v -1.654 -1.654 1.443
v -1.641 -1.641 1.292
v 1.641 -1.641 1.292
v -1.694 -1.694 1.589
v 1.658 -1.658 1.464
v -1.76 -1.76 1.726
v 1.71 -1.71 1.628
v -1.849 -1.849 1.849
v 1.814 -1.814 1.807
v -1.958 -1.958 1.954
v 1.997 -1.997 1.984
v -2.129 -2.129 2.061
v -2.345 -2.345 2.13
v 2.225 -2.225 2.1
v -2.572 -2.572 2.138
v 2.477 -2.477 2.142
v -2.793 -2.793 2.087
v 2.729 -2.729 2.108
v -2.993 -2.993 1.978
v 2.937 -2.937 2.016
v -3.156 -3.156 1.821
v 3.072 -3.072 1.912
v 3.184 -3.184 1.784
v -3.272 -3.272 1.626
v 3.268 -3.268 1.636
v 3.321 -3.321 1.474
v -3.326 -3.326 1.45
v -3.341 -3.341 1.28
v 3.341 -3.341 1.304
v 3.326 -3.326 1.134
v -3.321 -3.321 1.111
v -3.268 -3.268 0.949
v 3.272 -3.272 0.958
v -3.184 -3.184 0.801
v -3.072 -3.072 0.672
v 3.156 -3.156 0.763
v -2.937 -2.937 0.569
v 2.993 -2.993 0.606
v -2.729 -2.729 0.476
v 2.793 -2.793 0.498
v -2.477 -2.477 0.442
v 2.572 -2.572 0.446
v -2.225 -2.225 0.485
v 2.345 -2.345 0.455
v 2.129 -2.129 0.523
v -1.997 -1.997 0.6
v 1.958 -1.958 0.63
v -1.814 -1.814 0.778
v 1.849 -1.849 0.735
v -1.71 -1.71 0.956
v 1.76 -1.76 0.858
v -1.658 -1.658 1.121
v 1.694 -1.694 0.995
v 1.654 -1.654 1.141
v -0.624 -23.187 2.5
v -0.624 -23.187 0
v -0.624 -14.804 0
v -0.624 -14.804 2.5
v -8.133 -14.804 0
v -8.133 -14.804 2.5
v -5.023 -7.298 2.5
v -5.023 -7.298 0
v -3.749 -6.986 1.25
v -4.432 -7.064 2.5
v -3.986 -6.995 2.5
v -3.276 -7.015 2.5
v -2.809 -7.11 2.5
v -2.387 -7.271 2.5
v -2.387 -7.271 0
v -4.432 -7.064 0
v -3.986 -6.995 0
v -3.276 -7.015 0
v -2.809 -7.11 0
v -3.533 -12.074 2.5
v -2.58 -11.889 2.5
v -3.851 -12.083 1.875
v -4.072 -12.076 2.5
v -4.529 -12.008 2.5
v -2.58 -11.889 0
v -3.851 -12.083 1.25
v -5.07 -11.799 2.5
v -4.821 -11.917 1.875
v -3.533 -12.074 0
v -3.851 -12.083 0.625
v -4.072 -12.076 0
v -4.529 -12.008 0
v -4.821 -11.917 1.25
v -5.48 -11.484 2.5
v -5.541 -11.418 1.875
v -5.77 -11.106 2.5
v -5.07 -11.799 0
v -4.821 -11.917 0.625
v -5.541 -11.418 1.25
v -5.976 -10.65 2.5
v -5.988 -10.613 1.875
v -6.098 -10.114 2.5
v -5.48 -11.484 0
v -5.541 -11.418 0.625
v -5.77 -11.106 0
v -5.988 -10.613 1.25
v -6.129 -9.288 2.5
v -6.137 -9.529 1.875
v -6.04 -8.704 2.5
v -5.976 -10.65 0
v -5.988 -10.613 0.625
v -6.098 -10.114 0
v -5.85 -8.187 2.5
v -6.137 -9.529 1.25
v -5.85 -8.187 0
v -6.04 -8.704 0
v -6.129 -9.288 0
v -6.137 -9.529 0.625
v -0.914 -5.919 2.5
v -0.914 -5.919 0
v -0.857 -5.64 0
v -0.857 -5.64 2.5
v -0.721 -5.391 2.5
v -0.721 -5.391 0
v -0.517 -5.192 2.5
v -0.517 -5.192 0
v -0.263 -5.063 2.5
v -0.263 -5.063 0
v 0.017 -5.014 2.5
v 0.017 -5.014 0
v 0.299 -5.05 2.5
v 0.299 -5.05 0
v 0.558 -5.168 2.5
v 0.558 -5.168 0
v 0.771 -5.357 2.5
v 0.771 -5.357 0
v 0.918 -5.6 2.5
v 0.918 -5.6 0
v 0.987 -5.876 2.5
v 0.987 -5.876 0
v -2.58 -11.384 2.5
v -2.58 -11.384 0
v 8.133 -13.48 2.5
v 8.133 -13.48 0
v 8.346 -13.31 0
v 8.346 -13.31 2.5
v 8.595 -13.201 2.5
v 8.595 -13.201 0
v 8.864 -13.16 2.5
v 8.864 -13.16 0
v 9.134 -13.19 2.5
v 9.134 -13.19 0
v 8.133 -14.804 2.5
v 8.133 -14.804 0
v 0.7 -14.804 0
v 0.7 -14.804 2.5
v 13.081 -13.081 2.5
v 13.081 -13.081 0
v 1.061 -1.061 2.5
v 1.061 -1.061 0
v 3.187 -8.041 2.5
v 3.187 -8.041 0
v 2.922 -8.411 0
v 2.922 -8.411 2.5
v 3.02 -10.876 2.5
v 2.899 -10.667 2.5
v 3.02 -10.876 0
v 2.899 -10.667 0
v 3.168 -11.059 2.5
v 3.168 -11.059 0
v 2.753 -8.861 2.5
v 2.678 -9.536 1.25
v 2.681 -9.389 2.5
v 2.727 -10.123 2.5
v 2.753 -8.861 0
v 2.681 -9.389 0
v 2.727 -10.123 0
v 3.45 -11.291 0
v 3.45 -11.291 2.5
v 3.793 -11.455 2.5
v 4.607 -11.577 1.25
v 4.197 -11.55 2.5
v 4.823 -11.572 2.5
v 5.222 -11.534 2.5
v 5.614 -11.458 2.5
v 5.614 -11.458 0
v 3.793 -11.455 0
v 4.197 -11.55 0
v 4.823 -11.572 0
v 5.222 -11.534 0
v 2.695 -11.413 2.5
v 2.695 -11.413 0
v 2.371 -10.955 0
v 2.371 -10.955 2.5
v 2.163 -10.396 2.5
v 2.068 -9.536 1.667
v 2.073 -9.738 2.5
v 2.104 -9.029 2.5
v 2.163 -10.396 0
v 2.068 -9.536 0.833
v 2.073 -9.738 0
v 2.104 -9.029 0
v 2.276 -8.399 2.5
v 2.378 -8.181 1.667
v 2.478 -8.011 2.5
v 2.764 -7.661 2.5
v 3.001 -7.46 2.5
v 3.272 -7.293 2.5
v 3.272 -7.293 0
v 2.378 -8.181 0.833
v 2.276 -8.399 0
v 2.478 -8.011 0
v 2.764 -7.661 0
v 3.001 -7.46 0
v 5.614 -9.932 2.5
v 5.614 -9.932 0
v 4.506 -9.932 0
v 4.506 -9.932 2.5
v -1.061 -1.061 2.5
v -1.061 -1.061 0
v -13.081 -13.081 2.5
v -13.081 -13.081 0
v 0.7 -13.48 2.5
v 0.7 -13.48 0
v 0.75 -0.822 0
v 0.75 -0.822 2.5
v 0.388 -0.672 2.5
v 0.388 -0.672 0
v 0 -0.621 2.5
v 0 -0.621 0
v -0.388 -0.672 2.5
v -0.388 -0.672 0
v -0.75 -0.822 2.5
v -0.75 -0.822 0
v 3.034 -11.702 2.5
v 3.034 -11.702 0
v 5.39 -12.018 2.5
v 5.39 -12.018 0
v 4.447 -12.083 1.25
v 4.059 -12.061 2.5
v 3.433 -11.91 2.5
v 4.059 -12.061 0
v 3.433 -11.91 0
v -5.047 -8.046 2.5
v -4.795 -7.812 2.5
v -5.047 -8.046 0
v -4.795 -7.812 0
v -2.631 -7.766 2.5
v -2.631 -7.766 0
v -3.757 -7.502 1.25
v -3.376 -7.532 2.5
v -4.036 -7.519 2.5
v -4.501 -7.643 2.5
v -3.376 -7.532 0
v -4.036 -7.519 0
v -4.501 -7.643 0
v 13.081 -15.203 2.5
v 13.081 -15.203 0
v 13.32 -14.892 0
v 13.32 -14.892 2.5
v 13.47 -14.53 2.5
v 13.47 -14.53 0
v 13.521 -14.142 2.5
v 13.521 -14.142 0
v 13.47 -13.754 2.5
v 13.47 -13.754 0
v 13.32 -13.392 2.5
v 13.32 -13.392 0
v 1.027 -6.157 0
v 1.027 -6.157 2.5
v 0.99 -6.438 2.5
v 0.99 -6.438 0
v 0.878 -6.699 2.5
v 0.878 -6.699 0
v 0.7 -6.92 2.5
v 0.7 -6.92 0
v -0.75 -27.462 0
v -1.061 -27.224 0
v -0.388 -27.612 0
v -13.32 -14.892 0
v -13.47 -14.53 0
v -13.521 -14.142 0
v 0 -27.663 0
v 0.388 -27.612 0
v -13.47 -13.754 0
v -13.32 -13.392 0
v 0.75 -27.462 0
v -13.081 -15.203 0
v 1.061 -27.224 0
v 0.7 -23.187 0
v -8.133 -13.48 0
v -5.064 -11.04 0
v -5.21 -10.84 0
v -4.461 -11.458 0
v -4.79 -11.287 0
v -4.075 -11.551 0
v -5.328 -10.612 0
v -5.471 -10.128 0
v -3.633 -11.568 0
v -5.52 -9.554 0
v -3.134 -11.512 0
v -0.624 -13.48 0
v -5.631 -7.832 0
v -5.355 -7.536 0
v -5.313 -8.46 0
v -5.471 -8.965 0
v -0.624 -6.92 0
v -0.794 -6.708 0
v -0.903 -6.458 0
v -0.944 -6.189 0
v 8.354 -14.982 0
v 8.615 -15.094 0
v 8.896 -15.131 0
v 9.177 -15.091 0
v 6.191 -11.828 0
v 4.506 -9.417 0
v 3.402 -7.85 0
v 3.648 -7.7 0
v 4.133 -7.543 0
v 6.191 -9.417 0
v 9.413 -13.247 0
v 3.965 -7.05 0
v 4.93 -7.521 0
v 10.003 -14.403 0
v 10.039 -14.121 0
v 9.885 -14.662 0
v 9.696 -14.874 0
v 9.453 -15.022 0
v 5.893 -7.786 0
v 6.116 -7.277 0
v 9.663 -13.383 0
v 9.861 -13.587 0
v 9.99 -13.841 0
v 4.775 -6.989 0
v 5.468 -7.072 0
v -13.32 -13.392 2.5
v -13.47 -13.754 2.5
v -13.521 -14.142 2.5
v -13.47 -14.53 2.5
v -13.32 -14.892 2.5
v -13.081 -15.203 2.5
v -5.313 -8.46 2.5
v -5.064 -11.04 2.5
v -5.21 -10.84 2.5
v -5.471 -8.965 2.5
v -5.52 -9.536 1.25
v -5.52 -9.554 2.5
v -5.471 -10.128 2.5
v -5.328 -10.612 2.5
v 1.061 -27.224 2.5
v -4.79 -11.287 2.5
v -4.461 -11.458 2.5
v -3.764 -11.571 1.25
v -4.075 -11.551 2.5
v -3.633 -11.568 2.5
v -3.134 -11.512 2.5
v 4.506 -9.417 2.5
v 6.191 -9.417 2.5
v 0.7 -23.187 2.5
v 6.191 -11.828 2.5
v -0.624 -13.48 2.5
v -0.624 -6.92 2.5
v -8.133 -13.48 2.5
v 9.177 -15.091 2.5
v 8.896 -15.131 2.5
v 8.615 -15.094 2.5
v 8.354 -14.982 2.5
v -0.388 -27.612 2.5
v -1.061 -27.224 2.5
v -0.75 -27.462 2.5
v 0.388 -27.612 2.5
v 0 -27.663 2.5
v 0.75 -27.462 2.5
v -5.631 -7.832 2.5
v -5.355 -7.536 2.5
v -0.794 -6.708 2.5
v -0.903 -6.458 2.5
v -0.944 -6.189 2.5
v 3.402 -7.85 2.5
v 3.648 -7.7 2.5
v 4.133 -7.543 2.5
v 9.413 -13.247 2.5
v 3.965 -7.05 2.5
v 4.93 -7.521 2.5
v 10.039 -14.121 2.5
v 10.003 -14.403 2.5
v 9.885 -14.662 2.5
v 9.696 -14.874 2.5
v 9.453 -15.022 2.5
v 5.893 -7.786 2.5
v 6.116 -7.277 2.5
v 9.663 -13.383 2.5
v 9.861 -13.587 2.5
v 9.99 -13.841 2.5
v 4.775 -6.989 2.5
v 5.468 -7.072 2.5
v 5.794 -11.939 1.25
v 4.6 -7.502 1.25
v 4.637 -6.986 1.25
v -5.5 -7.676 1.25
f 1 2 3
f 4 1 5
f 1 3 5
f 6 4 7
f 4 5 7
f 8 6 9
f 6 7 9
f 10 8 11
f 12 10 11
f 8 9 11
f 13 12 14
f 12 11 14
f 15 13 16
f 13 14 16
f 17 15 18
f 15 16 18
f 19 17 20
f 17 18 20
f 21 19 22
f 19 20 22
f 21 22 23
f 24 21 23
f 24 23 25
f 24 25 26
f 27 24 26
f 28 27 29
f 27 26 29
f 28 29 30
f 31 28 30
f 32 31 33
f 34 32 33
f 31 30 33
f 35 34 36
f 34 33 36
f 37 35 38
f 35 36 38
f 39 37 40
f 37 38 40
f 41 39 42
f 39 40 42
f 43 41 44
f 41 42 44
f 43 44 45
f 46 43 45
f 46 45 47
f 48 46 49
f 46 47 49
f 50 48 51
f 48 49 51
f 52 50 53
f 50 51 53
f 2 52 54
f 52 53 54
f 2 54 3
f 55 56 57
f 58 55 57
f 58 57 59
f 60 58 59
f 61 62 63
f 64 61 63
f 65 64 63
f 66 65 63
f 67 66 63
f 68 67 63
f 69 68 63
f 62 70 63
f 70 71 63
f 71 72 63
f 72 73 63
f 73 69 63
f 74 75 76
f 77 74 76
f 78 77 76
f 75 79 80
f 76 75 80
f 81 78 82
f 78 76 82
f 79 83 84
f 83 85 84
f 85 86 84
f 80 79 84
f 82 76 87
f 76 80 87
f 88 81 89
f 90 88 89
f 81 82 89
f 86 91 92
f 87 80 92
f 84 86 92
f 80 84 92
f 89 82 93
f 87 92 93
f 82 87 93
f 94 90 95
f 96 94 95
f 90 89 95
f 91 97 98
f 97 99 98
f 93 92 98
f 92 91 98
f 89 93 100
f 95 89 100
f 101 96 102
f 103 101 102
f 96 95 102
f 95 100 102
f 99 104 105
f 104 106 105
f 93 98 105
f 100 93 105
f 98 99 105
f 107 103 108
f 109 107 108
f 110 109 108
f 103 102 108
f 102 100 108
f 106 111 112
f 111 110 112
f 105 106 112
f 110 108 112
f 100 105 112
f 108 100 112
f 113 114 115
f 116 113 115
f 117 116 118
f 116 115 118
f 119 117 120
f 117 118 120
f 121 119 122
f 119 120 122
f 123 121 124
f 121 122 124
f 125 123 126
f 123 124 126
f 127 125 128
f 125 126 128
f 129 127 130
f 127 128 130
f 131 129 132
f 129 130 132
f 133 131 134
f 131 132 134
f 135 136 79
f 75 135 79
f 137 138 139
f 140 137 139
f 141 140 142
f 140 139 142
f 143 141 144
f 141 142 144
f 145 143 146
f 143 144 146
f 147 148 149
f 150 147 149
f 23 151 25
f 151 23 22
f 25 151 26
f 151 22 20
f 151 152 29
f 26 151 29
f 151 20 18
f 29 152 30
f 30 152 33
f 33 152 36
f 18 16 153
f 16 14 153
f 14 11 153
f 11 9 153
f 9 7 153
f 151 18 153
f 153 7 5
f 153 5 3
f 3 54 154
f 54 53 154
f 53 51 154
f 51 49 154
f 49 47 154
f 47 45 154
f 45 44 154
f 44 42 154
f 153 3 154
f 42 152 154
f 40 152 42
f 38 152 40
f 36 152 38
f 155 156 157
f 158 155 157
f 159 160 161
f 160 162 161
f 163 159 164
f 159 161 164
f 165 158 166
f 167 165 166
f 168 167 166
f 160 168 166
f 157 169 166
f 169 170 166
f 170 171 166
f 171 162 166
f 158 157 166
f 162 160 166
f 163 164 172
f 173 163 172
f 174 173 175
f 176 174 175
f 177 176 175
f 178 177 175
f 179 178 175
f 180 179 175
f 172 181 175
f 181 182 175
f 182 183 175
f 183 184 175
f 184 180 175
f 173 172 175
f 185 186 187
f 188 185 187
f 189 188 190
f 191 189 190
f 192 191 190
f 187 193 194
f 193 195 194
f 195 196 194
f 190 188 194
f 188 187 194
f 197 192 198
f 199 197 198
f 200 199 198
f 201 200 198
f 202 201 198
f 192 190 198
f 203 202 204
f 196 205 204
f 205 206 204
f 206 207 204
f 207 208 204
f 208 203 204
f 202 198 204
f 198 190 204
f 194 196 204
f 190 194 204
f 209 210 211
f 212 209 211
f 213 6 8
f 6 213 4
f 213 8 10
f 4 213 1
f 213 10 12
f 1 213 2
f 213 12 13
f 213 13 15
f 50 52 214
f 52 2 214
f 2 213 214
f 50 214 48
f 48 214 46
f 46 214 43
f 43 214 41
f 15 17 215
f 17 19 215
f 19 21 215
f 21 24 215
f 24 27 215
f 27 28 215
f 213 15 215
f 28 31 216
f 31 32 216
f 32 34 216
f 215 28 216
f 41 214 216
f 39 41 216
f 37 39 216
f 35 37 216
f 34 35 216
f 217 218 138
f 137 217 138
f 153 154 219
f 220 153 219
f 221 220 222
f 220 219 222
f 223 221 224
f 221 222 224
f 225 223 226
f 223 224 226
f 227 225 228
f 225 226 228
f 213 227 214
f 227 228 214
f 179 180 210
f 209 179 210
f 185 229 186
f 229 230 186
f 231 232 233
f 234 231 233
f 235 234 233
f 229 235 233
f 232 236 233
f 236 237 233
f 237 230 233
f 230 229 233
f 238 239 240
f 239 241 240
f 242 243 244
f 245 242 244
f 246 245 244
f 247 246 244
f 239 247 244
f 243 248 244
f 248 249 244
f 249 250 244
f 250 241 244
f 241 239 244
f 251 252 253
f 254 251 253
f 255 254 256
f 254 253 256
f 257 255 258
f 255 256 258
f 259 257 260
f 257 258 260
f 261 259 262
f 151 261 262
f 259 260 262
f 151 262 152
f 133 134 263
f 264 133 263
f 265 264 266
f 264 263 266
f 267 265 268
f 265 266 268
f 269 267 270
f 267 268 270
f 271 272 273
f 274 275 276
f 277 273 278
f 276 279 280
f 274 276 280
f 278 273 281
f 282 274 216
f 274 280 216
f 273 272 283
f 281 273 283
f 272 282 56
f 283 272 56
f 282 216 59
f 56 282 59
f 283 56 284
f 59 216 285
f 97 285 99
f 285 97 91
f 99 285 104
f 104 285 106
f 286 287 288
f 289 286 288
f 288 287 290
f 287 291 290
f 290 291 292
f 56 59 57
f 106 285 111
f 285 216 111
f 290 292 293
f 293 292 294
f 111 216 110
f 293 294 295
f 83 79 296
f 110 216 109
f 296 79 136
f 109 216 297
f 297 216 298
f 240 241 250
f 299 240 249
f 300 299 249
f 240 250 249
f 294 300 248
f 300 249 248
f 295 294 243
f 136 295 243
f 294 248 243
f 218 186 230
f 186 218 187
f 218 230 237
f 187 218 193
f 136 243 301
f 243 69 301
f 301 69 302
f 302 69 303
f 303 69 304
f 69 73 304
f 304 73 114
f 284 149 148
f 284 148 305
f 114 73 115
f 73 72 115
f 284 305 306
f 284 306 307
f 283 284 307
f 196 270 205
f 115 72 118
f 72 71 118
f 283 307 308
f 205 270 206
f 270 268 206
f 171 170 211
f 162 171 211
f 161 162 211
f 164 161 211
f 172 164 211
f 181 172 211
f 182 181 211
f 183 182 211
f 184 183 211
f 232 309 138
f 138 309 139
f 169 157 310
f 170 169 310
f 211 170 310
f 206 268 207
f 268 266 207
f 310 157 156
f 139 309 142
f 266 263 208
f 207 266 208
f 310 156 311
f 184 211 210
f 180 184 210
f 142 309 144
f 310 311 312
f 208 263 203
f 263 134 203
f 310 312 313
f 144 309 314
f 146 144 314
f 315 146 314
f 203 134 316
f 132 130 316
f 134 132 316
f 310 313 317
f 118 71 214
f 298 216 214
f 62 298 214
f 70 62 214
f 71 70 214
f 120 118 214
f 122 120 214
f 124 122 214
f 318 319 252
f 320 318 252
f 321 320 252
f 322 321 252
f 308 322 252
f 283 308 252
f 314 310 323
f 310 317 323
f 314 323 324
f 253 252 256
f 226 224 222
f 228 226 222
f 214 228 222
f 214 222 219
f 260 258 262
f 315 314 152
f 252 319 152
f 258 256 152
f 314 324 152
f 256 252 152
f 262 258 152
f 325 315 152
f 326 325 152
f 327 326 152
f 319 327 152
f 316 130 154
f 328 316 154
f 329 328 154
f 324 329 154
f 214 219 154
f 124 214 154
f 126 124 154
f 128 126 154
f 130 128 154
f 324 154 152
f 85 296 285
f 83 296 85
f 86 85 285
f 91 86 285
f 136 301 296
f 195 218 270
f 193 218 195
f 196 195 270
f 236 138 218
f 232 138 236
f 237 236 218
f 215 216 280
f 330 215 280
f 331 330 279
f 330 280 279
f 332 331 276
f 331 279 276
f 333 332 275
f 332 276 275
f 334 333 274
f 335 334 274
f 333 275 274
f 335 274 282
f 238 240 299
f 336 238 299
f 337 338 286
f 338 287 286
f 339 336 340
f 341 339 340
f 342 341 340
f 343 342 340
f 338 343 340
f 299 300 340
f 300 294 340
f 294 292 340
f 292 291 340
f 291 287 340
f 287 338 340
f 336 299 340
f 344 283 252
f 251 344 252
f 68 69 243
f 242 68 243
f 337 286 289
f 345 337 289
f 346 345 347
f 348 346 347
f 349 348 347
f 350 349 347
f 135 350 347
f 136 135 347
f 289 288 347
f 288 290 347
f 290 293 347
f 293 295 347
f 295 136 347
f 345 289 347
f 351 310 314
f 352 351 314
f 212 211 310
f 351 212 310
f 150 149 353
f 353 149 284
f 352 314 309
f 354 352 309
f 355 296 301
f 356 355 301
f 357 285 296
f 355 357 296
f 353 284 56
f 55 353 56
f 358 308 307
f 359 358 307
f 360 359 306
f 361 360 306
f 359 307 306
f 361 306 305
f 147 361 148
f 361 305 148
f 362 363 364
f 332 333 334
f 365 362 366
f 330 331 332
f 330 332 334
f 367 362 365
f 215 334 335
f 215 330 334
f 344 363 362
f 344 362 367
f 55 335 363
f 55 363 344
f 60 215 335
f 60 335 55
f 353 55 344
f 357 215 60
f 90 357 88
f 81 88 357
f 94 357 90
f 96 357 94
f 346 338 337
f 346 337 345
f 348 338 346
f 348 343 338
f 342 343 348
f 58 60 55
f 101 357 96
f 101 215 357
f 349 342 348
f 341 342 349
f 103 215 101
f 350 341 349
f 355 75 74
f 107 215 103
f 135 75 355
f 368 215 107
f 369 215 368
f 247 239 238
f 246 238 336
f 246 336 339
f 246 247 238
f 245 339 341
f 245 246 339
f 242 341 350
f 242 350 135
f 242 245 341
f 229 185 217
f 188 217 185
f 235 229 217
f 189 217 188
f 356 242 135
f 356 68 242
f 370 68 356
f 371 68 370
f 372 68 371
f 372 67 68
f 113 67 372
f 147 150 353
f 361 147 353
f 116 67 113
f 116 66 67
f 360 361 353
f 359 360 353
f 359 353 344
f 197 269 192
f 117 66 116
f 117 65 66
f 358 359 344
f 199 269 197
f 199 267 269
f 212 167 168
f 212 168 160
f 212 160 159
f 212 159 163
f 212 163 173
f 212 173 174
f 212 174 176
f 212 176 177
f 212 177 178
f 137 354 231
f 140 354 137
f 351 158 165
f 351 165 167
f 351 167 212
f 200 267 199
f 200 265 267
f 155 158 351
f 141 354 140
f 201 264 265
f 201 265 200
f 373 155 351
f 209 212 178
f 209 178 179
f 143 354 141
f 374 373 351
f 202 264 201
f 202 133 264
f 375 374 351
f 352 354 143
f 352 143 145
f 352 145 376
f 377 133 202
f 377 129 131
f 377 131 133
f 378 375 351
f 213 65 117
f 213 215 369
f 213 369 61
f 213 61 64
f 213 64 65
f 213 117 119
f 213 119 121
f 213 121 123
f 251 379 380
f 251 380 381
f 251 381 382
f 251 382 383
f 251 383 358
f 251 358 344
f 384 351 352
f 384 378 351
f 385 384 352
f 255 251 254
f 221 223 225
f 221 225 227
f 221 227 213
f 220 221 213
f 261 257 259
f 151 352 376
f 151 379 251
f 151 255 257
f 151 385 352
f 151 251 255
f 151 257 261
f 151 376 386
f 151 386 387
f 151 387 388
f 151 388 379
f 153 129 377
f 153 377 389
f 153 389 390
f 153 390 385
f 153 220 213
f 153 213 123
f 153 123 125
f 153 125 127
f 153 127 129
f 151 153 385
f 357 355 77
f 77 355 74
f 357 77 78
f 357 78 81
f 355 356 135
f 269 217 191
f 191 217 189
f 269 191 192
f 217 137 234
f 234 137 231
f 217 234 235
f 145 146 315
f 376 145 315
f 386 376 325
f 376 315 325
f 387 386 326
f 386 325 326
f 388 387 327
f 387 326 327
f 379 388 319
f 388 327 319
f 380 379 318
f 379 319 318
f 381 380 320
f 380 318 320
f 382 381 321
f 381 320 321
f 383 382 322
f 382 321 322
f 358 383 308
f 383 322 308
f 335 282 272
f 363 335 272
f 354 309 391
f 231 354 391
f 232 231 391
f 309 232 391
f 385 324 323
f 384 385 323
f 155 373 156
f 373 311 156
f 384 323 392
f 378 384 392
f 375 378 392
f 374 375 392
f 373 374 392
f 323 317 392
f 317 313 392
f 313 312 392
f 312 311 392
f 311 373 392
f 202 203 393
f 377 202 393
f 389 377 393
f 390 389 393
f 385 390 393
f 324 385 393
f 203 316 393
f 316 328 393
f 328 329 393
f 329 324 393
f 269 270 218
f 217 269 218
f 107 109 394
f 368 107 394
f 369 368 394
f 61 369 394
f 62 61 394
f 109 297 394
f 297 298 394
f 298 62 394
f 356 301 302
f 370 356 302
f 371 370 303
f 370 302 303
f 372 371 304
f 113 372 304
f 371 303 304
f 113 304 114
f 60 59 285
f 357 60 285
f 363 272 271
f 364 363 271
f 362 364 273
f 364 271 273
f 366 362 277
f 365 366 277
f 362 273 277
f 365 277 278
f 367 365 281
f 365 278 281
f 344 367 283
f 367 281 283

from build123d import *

# Parameters (mm, degrees)
F1_DEPTH = 2.5
F2_R     = 0.85
F3_DEPTH = 12.5


with BuildPart() as f1:
    # F0 (on Top) → F1 (new body)
    with BuildSketch(Plane.XY):
        with BuildLine():
            Line((13.081475452, -13.081475452), (1.0606601718, -1.0606601718))
            ThreePointArc((1.0606601718, -1.0606601718), (0, -0.6213203436), (-1.0606601718, -1.0606601718))
            Line((-1.0606601718, -1.0606601718), (-13.081475452, -13.081475452))
            ThreePointArc((-13.081475452, -13.081475452), (-13.5208152802, -14.1421356237), (-13.081475452, -15.2027957955))
            Line((-13.081475452, -15.2027957955), (-1.0606601718, -27.2236110757))
            ThreePointArc((-1.0606601718, -27.2236110757), (0, -27.6629509039), (1.0606601718, -27.2236110757))
            Line((1.0606601718, -27.2236110757), (13.081475452, -15.2027957955))
            ThreePointArc((13.081475452, -15.2027957955), (13.5208152802, -14.1421356237), (13.081475452, -13.081475452))
        make_face()
        with BuildLine():
            add(Edge.make_bspline(
                [(-2.6307656823, -7.7655284531), (-3.193916724, -7.5018565781), (-3.7570677656, -7.5018565781)],
                knots=[0, 0, 0, 1, 1, 1], degree=2))
            add(Edge.make_bspline(
                [(-3.7570677656, -7.5018565781), (-4.5741250573, -7.5018565781), (-5.0472153351, -8.0460189045)],
                knots=[0, 0, 0, 1, 1, 1], degree=2))
            add(Edge.make_bspline(
                [(-5.0472153351, -8.0460189045), (-5.5203056128, -8.5901812309), (-5.5203056128, -9.5363617864)],
                knots=[0, 0, 0, 1, 1, 1], degree=2))
            add(Edge.make_bspline(
                [(-5.5203056128, -9.5363617864), (-5.5203056128, -10.5085840087), (-5.0640339115, -11.0397255017)],
                knots=[0, 0, 0, 1, 1, 1], degree=2))
            add(Edge.make_bspline(
                [(-5.0640339115, -11.0397255017), (-4.6077622101, -11.5708669948), (-3.7635781823, -11.5708669948)],
                knots=[0, 0, 0, 1, 1, 1], degree=2))
            add(Edge.make_bspline(
                [(-3.7635781823, -11.5708669948), (-3.2449149878, -11.5708669948), (-2.5797674184, -11.3842350503)],
                knots=[0, 0, 0, 1, 1, 1], degree=2))
            Line((-2.5797674184, -11.3842350503), (-2.5797674184, -11.888792342))
            add(Edge.make_bspline(
                [(-2.5797674184, -11.888792342), (-3.0951754045, -12.0830197725), (-3.8514688073, -12.0830197725)],
                knots=[0, 0, 0, 1, 1, 1], degree=2))
            add(Edge.make_bspline(
                [(-3.8514688073, -12.0830197725), (-4.9463038767, -12.0830197725), (-5.541464467, -11.4178722031)],
                knots=[0, 0, 0, 1, 1, 1], degree=2))
            add(Edge.make_bspline(
                [(-5.541464467, -11.4178722031), (-6.1366250573, -10.7527246337), (-6.1366250573, -9.5287663003)],
                knots=[0, 0, 0, 1, 1, 1], degree=2))
            add(Edge.make_bspline(
                [(-6.1366250573, -9.5287663003), (-6.1366250573, -8.7627072725), (-5.850166724, -8.1865353975)],
                knots=[0, 0, 0, 1, 1, 1], degree=2))
            add(Edge.make_bspline(
                [(-5.850166724, -8.1865353975), (-5.5637083906, -7.6103635225), (-5.0228012726, -7.2984060573)],
                knots=[0, 0, 0, 1, 1, 1], degree=2))
            add(Edge.make_bspline(
                [(-5.0228012726, -7.2984060573), (-4.4818941545, -6.986448592), (-3.7494722795, -6.986448592)],
                knots=[0, 0, 0, 1, 1, 1], degree=2))
            add(Edge.make_bspline(
                [(-3.7494722795, -6.986448592), (-2.9703924184, -6.986448592), (-2.3866250573, -7.2707367864)],
                knots=[0, 0, 0, 1, 1, 1], degree=2))
            Line((-2.3866250573, -7.2707367864), (-2.6307656823, -7.7655284531))
        make_face(mode=Mode.SUBTRACT)
        with BuildLine():
            Line((-8.1334756687, -14.8039748892), (-8.1334756687, -13.4802963582))
            Line((-8.1334756687, -13.4802963582), (-0.6236797201, -13.4802963582))
            Line((-0.6236797201, -13.4802963582), (-0.6236797201, -6.9198086858))
            ThreePointArc((-0.6236797201, -6.9198086858), (-0.9032194318, -6.4583786209), (-0.9135835525, -5.9189782686))
            ThreePointArc((-0.9135835525, -5.9189782686), (0.0168397474, -5.0141534426), (0.9868078824, -5.876451129))
            ThreePointArc((0.9868078824, -5.876451129), (0.9900106564, -6.4384308628), (0.6999988109, -6.9198086858))
            Line((0.6999988109, -6.9198086858), (0.6999988109, -13.4802963582))
            Line((0.6999988109, -13.4802963582), (8.1334756687, -13.4802963582))
            ThreePointArc((8.1334756687, -13.4802963582), (8.5949057336, -13.2007566465), (9.134306086, -13.1903925258))
            ThreePointArc((9.134306086, -13.1903925258), (10.0391309119, -14.1208158258), (9.1768332255, -15.0907839607))
            ThreePointArc((9.1768332255, -15.0907839607), (8.6148534917, -15.0939867347), (8.1334756687, -14.8039748892))
            Line((8.1334756687, -14.8039748892), (0.6999988109, -14.8039748892))
            Line((0.6999988109, -14.8039748892), (0.6999988109, -23.1867600232))
            Line((0.6999988109, -23.1867600232), (-0.6236797201, -23.1867600232))
            Line((-0.6236797201, -23.1867600232), (-0.6236797201, -14.8039748892))
            Line((-0.6236797201, -14.8039748892), (-8.1334756687, -14.8039748892))
        make_face(mode=Mode.SUBTRACT)
        with BuildLine():
            Line((4.5060936962, -9.9324142291), (4.5060936962, -9.417006243))
            Line((4.5060936962, -9.417006243), (6.1912065434, -9.417006243))
            Line((6.1912065434, -9.417006243), (6.1912065434, -11.8280305486))
            add(Edge.make_bspline(
                [(6.1912065434, -11.8280305486), (5.7973263351, -11.9538986041), (5.3904252934, -12.0184602361)],
                knots=[0, 0, 0, 1, 1, 1], degree=2))
            add(Edge.make_bspline(
                [(5.3904252934, -12.0184602361), (4.9835242517, -12.083021868), (4.4474999462, -12.083021868)],
                knots=[0, 0, 0, 1, 1, 1], degree=2))
            add(Edge.make_bspline(
                [(4.4474999462, -12.083021868), (3.3222829323, -12.083021868), (2.6951127934, -11.4129914861)],
                knots=[0, 0, 0, 1, 1, 1], degree=2))
            add(Edge.make_bspline(
                [(2.6951127934, -11.4129914861), (2.0679426545, -10.7429611041), (2.0679426545, -9.5363638819)],
                knots=[0, 0, 0, 1, 1, 1], degree=2))
            add(Edge.make_bspline(
                [(2.0679426545, -9.5363638819), (2.0679426545, -8.762709368), (2.3782725156, -8.1811121458)],
                knots=[0, 0, 0, 1, 1, 1], degree=2))
            add(Edge.make_bspline(
                [(2.3782725156, -8.1811121458), (2.6886023767, -7.5995149236), (3.2718272031, -7.2929828055)],
                knots=[0, 0, 0, 1, 1, 1], degree=2))
            add(Edge.make_bspline(
                [(3.2718272031, -7.2929828055), (3.8550520295, -6.9864506875), (4.637387099, -6.9864506875)],
                knots=[0, 0, 0, 1, 1, 1], degree=2))
            add(Edge.make_bspline(
                [(4.637387099, -6.9864506875), (5.4316579323, -6.9864506875), (6.1163367517, -7.2772492986)],
                knots=[0, 0, 0, 1, 1, 1], degree=2))
            Line((6.1163367517, -7.2772492986), (5.8928124462, -7.786146868))
            add(Edge.make_bspline(
                [(5.8928124462, -7.786146868), (5.2211544601, -7.5018586736), (4.6004947378, -7.5018586736)],
                knots=[0, 0, 0, 1, 1, 1], degree=2))
            add(Edge.make_bspline(
                [(4.6004947378, -7.5018586736), (3.6955468212, -7.5018586736), (3.1866492517, -8.0405956527)],
                knots=[0, 0, 0, 1, 1, 1], degree=2))
            add(Edge.make_bspline(
                [(3.1866492517, -8.0405956527), (2.6777516823, -8.5793326319), (2.6777516823, -9.5363638819)],
                knots=[0, 0, 0, 1, 1, 1], degree=2))
            add(Edge.make_bspline(
                [(2.6777516823, -9.5363638819), (2.6777516823, -10.540053118), (3.1676605365, -11.0587163125)],
                knots=[0, 0, 0, 1, 1, 1], degree=2))
            add(Edge.make_bspline(
                [(3.1676605365, -11.0587163125), (3.6575693906, -11.5773795069), (4.6070051545, -11.5773795069)],
                knots=[0, 0, 0, 1, 1, 1], degree=2))
            add(Edge.make_bspline(
                [(4.6070051545, -11.5773795069), (5.1224131406, -11.5773795069), (5.613949599, -11.458021868)],
                knots=[0, 0, 0, 1, 1, 1], degree=2))
            Line((5.613949599, -11.458021868), (5.613949599, -9.9324142291))
            Line((5.613949599, -9.9324142291), (4.5060936962, -9.9324142291))
        make_face(mode=Mode.SUBTRACT)
    extrude(amount=F1_DEPTH)

    # F2 (on Right) → F3 (cut, symmetric)
    with BuildSketch(Plane.YZ):
        with Locations((-2.4908210296, 1.292226194)):
            Circle(F2_R)
    extrude(amount=F3_DEPTH, both=True, mode=Mode.SUBTRACT)


solid = f1.part
